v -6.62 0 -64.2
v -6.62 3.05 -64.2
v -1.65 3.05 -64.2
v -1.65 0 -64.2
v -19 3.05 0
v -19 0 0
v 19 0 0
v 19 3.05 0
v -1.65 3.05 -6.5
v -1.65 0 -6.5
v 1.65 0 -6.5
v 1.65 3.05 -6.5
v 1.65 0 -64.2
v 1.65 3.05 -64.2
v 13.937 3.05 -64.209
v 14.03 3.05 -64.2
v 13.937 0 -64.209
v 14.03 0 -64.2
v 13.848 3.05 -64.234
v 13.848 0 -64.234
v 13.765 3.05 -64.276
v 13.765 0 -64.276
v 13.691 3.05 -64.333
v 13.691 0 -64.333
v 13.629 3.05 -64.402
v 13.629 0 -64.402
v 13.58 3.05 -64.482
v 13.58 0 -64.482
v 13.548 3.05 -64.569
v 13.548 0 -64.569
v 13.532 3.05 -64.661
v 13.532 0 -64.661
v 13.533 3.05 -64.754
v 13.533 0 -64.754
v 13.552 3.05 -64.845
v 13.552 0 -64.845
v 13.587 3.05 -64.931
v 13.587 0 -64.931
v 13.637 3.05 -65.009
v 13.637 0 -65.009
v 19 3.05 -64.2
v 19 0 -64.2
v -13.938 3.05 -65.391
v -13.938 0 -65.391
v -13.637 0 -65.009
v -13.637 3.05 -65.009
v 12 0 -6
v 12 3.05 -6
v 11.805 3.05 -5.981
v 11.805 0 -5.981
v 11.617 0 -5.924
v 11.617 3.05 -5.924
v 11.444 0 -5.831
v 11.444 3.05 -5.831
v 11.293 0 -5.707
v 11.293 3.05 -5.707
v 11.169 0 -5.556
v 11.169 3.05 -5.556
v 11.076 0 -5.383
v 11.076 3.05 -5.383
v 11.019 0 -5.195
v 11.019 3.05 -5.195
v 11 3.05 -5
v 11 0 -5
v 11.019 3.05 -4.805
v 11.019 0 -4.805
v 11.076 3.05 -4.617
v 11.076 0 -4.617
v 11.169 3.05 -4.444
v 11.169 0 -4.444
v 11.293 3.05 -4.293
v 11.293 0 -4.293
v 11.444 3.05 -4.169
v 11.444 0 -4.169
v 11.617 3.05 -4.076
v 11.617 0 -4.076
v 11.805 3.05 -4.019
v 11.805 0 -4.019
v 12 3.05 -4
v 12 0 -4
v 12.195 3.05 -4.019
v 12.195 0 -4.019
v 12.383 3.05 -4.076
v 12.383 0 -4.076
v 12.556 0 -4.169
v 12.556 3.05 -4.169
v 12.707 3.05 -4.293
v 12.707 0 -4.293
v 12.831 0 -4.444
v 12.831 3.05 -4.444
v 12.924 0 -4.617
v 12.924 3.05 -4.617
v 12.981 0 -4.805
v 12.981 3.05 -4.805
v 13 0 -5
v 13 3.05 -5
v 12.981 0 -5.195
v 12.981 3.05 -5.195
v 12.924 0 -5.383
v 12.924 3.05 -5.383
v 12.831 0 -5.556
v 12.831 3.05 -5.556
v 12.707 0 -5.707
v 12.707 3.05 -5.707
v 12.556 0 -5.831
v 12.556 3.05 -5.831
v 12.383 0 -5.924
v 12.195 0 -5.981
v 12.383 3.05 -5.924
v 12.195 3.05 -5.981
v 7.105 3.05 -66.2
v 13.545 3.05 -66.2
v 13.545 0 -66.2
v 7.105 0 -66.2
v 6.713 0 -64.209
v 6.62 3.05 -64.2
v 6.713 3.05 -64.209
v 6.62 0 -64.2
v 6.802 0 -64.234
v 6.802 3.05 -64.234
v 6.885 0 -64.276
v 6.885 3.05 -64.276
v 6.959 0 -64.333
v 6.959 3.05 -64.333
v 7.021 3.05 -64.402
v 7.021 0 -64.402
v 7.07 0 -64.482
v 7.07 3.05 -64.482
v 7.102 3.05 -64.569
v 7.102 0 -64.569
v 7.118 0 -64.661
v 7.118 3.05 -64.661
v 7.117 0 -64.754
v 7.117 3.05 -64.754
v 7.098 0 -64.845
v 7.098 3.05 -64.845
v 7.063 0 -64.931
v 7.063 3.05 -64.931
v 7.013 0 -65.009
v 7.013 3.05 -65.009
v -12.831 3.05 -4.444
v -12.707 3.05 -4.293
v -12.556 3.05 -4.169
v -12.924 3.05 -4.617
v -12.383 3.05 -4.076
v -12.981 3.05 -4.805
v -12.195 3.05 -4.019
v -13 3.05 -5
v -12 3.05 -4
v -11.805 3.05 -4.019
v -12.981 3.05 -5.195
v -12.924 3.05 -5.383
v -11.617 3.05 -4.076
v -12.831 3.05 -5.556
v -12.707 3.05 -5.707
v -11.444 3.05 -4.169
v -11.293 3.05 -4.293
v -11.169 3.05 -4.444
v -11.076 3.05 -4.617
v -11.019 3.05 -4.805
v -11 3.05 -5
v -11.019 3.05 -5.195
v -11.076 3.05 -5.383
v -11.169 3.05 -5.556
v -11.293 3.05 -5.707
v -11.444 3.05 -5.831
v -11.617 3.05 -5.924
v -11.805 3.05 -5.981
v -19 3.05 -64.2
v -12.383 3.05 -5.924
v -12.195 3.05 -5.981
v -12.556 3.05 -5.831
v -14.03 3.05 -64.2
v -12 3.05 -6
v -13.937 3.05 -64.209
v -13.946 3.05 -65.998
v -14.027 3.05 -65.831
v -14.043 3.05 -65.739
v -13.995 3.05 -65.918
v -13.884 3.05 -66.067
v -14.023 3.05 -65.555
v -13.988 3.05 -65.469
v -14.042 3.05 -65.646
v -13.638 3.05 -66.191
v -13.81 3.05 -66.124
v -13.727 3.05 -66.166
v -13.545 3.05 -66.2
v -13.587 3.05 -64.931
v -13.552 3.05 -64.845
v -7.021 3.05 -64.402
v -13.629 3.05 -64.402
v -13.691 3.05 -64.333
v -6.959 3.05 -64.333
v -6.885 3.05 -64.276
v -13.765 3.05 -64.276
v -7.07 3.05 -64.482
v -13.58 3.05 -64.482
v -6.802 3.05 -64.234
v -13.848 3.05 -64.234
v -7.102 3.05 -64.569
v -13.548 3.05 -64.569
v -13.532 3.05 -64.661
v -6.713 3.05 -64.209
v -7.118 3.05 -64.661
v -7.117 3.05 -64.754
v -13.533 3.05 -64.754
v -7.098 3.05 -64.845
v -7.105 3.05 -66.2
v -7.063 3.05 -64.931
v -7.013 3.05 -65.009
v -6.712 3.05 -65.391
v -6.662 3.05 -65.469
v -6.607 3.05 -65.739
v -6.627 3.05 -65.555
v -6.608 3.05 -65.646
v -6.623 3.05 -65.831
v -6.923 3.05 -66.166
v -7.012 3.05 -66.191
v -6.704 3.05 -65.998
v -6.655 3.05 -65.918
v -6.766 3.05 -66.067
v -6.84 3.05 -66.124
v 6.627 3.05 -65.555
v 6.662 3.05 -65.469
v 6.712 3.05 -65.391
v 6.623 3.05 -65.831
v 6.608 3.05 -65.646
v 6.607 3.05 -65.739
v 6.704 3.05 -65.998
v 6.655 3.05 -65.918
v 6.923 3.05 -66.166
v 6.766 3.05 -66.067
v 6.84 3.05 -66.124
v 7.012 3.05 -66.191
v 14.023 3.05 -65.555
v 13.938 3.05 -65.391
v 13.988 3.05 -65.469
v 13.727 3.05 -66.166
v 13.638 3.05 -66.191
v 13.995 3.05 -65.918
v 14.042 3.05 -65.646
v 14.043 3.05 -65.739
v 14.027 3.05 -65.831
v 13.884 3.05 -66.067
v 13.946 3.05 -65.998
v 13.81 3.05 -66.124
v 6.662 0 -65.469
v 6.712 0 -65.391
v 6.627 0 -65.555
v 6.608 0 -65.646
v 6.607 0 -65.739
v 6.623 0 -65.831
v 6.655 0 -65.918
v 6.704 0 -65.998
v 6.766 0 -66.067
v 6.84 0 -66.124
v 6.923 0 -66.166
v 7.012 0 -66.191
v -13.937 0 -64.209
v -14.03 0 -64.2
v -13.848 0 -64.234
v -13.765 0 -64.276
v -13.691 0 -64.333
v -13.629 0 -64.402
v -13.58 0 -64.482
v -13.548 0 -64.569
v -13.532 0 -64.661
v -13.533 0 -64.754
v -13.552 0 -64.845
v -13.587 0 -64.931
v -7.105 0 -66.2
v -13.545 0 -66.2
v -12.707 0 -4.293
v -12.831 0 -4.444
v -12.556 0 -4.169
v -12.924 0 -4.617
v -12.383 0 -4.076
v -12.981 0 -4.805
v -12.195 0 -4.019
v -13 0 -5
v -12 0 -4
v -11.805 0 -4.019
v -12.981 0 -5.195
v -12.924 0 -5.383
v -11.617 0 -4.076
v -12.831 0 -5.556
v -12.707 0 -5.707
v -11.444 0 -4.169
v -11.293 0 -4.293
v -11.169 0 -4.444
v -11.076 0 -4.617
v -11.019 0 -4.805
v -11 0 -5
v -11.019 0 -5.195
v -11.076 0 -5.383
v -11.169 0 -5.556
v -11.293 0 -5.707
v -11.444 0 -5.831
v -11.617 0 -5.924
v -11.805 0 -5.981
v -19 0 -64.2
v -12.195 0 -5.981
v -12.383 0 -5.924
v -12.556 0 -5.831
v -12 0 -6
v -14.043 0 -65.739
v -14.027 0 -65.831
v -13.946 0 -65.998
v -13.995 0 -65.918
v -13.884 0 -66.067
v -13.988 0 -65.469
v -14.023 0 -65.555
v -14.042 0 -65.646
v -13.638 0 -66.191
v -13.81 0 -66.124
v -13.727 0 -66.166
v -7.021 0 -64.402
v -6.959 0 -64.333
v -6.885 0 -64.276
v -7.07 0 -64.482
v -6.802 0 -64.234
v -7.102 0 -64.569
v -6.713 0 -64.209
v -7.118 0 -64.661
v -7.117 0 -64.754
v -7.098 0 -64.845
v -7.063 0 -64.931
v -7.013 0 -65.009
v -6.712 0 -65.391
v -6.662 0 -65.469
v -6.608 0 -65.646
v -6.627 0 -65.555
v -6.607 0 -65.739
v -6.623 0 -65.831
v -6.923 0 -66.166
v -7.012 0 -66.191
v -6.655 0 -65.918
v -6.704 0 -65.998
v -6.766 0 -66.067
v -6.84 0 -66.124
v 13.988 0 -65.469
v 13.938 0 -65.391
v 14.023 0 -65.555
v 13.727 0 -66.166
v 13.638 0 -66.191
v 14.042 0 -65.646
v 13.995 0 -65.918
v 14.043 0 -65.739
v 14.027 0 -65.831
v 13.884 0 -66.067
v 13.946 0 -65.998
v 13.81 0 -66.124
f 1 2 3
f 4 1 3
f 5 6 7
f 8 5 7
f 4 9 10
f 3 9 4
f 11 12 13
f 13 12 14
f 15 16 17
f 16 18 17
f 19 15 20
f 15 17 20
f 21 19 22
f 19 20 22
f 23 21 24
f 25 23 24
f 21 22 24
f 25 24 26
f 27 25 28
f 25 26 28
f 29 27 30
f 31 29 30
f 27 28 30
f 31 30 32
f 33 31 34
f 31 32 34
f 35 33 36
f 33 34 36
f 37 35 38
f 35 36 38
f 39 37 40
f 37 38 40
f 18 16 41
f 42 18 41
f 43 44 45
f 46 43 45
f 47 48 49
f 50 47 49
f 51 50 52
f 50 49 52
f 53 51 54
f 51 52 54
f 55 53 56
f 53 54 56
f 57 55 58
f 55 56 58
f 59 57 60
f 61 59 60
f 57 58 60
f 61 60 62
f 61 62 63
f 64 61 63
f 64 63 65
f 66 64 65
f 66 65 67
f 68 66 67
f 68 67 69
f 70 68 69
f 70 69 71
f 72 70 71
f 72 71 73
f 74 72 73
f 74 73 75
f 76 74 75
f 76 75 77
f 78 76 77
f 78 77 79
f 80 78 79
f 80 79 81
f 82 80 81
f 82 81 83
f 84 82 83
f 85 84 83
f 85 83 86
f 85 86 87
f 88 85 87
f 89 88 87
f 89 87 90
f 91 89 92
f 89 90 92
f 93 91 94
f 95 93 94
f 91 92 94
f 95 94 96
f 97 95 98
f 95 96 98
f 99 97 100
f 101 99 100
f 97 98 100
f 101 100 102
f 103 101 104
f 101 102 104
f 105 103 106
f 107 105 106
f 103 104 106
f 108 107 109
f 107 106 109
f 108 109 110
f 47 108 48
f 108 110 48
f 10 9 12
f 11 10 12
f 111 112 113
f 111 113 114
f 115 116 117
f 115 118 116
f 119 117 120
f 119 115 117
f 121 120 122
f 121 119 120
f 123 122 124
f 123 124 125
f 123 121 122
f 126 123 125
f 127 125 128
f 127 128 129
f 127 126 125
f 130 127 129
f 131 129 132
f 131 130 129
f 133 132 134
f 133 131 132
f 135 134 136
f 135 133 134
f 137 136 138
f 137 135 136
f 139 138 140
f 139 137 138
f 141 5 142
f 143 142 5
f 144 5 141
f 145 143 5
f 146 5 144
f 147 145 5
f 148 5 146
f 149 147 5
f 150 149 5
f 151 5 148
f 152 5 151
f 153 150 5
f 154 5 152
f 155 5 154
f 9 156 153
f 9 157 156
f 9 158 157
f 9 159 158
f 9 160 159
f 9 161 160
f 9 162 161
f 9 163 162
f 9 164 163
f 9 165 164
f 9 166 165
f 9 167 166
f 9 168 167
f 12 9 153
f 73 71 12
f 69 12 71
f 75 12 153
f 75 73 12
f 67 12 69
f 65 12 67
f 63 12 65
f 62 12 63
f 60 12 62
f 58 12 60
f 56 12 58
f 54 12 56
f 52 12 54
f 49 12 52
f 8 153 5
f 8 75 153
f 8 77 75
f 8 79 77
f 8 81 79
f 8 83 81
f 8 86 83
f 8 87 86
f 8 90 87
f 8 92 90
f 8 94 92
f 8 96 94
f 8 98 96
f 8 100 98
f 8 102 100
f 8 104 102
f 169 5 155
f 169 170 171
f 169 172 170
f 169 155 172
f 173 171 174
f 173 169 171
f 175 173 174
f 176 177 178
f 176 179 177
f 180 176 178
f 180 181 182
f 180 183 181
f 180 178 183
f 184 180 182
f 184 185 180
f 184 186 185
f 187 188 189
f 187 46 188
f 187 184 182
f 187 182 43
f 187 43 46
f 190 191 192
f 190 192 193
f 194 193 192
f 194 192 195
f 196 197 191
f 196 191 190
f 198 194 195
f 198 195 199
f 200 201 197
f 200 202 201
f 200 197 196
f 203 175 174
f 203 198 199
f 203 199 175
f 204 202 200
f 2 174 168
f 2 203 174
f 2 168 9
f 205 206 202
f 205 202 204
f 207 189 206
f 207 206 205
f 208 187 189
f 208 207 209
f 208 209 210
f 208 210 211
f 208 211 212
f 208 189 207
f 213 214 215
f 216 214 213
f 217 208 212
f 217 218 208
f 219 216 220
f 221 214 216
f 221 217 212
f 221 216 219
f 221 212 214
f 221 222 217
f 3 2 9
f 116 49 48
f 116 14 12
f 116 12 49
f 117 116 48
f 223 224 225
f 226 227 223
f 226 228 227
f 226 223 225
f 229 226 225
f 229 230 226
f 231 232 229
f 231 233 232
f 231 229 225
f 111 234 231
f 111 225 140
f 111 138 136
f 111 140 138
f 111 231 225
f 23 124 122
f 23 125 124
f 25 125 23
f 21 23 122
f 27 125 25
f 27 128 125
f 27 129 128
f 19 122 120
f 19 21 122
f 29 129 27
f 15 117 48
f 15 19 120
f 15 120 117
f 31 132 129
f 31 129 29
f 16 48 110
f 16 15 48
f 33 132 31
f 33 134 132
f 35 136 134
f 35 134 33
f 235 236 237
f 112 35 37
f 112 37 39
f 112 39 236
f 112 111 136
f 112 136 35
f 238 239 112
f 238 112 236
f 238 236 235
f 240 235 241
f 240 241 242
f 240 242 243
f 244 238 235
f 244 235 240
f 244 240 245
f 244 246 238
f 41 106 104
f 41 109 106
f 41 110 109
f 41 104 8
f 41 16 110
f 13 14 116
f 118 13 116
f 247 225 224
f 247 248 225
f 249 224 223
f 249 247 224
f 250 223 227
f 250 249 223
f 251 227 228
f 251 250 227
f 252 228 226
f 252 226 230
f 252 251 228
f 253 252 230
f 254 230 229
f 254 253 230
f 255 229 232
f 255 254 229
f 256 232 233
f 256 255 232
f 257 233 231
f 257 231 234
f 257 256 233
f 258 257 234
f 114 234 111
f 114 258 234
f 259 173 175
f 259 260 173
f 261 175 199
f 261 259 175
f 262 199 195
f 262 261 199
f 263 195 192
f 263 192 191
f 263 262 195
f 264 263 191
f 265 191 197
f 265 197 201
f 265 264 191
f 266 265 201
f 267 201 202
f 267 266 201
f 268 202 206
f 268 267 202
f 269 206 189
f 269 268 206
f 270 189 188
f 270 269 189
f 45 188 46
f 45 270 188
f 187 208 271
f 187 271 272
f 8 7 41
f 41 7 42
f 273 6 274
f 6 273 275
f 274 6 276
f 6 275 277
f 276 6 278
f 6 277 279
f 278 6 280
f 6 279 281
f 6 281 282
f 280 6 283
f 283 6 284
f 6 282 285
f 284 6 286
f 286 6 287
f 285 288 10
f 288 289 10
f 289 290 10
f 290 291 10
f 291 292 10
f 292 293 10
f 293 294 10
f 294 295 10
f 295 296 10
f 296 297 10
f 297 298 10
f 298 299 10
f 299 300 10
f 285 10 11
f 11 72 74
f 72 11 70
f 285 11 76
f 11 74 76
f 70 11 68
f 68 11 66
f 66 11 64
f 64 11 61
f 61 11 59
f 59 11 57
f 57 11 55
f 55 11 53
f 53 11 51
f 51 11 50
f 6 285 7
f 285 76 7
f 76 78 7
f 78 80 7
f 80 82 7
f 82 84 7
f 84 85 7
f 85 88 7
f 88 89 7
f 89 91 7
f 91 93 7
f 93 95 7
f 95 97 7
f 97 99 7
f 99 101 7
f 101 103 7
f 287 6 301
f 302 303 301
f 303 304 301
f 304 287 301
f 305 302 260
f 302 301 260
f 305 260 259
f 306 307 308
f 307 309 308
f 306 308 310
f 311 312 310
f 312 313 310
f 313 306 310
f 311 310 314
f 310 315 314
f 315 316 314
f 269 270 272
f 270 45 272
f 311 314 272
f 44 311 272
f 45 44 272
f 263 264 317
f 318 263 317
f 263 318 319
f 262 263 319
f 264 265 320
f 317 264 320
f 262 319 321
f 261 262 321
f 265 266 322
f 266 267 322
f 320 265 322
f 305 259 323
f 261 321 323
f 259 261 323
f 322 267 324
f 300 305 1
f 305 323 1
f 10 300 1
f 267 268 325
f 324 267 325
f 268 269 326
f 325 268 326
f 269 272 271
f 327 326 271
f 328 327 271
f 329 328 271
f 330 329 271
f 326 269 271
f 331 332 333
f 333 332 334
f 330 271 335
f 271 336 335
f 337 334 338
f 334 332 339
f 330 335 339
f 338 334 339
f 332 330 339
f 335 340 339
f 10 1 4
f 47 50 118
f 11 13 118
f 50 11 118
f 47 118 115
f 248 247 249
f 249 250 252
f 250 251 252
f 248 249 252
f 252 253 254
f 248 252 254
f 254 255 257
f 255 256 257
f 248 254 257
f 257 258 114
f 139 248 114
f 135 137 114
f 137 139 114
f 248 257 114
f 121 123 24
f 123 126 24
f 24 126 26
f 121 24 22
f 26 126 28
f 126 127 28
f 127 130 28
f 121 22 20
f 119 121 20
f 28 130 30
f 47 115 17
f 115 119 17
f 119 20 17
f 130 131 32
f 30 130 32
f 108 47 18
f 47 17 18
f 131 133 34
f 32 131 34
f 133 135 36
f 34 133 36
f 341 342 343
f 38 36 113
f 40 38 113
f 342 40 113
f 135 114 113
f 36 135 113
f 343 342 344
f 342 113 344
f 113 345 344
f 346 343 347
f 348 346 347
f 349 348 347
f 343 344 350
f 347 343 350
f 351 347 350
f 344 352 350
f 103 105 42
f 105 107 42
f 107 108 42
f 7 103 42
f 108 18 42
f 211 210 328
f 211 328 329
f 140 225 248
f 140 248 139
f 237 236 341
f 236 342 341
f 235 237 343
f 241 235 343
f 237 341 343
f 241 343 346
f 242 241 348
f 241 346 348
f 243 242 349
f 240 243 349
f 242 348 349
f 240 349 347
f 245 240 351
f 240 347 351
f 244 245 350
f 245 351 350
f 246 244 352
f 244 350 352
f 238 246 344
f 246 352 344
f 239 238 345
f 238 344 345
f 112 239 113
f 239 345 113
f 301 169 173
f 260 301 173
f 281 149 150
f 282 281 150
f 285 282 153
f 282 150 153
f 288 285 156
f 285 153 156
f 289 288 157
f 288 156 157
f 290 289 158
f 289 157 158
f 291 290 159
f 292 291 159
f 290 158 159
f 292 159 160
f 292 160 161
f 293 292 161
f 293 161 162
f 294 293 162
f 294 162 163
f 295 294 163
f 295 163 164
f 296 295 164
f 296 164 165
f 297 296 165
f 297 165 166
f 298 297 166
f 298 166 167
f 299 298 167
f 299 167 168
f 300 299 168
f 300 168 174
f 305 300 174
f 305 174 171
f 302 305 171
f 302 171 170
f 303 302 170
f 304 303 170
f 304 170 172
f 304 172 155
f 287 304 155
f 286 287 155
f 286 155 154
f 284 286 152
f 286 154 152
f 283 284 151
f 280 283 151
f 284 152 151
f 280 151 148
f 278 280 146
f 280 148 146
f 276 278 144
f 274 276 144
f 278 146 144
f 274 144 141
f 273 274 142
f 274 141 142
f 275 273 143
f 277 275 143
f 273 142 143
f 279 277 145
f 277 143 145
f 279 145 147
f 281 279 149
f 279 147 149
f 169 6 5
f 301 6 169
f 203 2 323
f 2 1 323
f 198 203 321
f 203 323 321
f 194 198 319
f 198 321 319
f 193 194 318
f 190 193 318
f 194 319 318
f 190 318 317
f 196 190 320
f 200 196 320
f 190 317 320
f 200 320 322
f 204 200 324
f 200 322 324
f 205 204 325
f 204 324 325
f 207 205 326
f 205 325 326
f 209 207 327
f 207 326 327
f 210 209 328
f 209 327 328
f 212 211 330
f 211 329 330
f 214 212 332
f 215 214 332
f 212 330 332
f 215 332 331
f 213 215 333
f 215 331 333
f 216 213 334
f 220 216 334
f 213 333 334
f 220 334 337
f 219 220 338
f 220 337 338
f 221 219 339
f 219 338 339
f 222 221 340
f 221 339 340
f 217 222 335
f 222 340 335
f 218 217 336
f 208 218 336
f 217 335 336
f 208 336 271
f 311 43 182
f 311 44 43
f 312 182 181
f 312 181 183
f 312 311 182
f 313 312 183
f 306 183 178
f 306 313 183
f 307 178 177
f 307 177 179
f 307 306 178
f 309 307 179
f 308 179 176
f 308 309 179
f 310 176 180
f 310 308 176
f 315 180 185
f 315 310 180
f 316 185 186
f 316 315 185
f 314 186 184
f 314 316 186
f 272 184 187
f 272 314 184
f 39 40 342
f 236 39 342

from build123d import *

# Parameters (mm, degrees)
SKETCH1_W           = 38
SKETCH1_H           = 72.5
BOSS_EXTRUDE1_DEPTH = 3.05
SKETCH4_W           = 1.65
SKETCH4_H           = 1
SKETCH4_H_2         = 61.8
CUT_EXTRUDE1_DEPTH  = 76.010349286
SKETCH7_R           = 1
CUT_EXTRUDE4_DEPTH  = 76.010349286
SKETCH8_W           = 38
SKETCH8_H           = 8.3
CUT_EXTRUDE5_DEPTH  = 76.010349286
BOSS_EXTRUDE3_DEPTH = 3.05
FILLET2_R           = 0.5


with BuildPart() as part:
    # Sketch1 → Boss-Extrude1 (new body)
    with BuildSketch(Plane(origin=(0, 0, 0), x_dir=(1, 0, 0), z_dir=(0, 1, 0))):
        with Locations((0, 36.25)):
            Rectangle(SKETCH1_W, SKETCH1_H)
    extrude(amount=BOSS_EXTRUDE1_DEPTH)

    # Sketch4 → Cut-Extrude1 (cut, through all)
    with BuildSketch(Plane(origin=(0, 3.05, 0), x_dir=(1, 0, 0), z_dir=(0, 1, 0))):
        with Locations((-0.825, 70)):
            Rectangle(SKETCH4_W, SKETCH4_H)
        with Locations((-0.825, 37.4)):
            Rectangle(SKETCH4_W, SKETCH4_H_2)
        with Locations((0.825, 37.4)):
            Rectangle(SKETCH4_W, SKETCH4_H_2)
        with Locations((0.825, 70)):
            Rectangle(SKETCH4_W, SKETCH4_H)
    extrude(amount=-CUT_EXTRUDE1_DEPTH, mode=Mode.SUBTRACT)

    # Sketch7 → Cut-Extrude4 (cut, through all)
    with BuildSketch(Plane(origin=(0, 3.05, 0), x_dir=(1, 0, 0), z_dir=(0, 1, 0))):
        with Locations(Location((-12, 5, 0), (0, 0, 270))):
            Circle(SKETCH7_R)
        with Locations(Location((12, 5, 0), (0, 0, 90))):
            Circle(SKETCH7_R)
    extrude(amount=-CUT_EXTRUDE4_DEPTH, mode=Mode.SUBTRACT)

    # Sketch8 → Cut-Extrude5 (cut, through all)
    with BuildSketch(Plane(origin=(0, 3.05, 0), x_dir=(1, 0, 0), z_dir=(0, 1, 0))):
        with Locations((0, 68.35)):
            Rectangle(SKETCH8_W, SKETCH8_H)
    extrude(amount=-CUT_EXTRUDE5_DEPTH, mode=Mode.SUBTRACT)

    # Sketch9 → Boss-Extrude3 (add)
    with BuildSketch(Plane(origin=(0, 3.05, 0), x_dir=(1, 0, 0), z_dir=(0, 1, 0))):
        Polygon((-14.575, 66.2), (-13, 64.2), (-7.65, 64.2), (-6.075, 66.2), align=None)
        Polygon((6.075, 66.2), (7.65, 64.2), (13, 64.2), (14.575, 66.2), align=None)
    extrude(amount=-BOSS_EXTRUDE3_DEPTH)

    # Fillet2
    fillet2_edges = [part.edges().sort_by_distance(p)[0] for p in [
        (-6.075, 1.525, -66.2),
        (-7.65, 1.525, -64.2),
        (-13, 1.525, -64.2),
        (-14.575, 1.525, -66.2),
        (14.575, 1.525, -66.2),
        (13, 1.525, -64.2),
        (7.65, 1.525, -64.2),
        (6.075, 1.525, -66.2),
    ]]
    fillet(fillet2_edges, radius=FILLET2_R)


solid = part.part
